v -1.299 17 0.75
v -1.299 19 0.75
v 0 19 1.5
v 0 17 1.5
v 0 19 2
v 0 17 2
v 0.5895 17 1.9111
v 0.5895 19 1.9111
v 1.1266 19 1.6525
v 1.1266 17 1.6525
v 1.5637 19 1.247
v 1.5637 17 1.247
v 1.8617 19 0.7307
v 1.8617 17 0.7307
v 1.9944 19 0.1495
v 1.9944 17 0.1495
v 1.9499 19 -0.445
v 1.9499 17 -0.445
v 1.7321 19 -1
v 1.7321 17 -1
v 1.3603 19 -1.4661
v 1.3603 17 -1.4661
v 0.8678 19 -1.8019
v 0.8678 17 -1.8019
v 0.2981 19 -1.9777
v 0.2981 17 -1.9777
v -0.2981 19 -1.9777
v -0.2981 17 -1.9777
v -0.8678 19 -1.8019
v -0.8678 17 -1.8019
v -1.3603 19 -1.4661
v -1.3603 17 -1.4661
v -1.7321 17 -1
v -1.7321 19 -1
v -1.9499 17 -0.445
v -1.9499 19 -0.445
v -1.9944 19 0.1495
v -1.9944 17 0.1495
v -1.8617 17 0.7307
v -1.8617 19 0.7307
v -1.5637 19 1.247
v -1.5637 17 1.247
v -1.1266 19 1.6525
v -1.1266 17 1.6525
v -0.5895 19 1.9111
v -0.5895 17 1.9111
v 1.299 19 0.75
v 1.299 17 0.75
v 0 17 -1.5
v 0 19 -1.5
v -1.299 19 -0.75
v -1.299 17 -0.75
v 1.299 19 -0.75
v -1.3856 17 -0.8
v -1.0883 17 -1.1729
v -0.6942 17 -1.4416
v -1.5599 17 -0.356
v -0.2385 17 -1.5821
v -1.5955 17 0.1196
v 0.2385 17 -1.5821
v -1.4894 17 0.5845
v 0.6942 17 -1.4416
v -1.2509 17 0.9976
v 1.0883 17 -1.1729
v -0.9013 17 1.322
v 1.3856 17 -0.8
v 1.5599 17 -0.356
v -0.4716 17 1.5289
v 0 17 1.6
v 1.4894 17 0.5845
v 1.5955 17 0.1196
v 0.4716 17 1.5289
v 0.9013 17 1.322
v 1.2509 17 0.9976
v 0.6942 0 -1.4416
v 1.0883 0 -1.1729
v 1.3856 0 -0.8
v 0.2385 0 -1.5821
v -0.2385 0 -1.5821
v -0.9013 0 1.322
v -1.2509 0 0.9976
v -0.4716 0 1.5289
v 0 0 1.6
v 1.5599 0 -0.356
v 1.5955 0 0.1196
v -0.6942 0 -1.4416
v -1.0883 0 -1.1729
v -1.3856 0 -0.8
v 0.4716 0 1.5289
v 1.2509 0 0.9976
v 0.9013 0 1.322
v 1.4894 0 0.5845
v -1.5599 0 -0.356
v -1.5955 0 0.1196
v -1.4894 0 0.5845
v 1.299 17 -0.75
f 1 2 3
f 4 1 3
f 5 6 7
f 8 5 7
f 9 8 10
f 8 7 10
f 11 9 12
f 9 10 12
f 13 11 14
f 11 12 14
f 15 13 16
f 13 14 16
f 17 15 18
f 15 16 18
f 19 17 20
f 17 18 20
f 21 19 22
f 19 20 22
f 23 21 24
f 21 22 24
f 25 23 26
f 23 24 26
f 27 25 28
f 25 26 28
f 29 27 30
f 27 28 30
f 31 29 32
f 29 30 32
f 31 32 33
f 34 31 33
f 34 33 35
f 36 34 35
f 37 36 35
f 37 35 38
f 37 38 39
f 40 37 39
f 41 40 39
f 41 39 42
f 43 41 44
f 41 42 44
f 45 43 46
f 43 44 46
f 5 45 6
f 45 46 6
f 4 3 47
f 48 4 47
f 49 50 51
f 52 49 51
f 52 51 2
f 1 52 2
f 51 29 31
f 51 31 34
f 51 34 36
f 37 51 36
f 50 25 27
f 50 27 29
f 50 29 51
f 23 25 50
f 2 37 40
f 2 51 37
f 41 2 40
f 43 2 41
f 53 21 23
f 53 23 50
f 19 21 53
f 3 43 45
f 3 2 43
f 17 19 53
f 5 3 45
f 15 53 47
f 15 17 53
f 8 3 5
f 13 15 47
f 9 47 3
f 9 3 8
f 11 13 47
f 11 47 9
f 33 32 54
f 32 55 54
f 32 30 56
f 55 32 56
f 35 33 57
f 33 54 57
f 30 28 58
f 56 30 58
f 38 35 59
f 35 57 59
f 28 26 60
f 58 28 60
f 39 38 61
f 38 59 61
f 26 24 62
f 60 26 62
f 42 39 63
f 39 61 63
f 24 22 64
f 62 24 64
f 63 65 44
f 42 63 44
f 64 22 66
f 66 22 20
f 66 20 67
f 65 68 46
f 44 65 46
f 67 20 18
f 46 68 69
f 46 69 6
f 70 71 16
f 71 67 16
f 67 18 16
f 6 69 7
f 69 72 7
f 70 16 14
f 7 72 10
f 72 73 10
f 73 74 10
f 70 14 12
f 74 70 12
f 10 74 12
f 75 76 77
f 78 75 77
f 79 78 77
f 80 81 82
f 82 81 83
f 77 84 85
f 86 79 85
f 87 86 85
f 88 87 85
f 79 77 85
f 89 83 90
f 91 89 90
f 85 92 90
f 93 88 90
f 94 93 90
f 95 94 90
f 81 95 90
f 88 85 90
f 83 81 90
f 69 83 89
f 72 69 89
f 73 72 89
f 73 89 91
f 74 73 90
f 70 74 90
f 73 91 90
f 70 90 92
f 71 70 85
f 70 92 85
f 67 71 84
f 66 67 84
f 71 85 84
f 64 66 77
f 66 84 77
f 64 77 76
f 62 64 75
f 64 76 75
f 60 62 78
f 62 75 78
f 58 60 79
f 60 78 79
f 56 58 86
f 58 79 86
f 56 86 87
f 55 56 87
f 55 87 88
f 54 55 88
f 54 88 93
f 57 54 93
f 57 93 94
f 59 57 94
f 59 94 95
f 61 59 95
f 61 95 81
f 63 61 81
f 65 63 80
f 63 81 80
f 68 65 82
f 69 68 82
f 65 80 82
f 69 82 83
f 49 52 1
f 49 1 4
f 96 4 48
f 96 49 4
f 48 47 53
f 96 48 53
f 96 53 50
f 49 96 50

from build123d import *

# Parameters (mm, degrees)
SKETCH1_R    = 1.6
LENGTH_DEPTH = 17
SKETCH2_R    = 2
CAP_DEPTH    = 2
HEX_2_DEPTH  = 2


with BuildPart() as part:
    # Sketch1 → Length (new body)
    with BuildSketch(Plane(origin=(0, 0, 0), x_dir=(1, 0, 0), z_dir=(0, 1, 0))):
        with Locations(Location((0, 0, 0), (0, 0, 270))):
            Circle(SKETCH1_R)
    extrude(amount=LENGTH_DEPTH)

    # Sketch2 → Cap (add)
    with BuildSketch(Plane(origin=(0, 17, 0), x_dir=(1, 0, 0), z_dir=(0, 1, 0))):
        with Locations(Location((0, 0, 0), (0, 0, 270))):
            Circle(SKETCH2_R)
    extrude(amount=CAP_DEPTH)

    # Sketch3 → Hex 2 (cut)
    with BuildSketch(Plane(origin=(0, 19, 0), x_dir=(1, 0, 0), z_dir=(0, 1, 0))):
        Polygon((0, 1.5), (-1.299038106, 0.75), (-1.299038106, -0.75), (0, -1.5), (1.299038106, -0.75), (1.299038106, 0.75), align=None)
    extrude(amount=-HEX_2_DEPTH, mode=Mode.SUBTRACT)


solid = part.part
